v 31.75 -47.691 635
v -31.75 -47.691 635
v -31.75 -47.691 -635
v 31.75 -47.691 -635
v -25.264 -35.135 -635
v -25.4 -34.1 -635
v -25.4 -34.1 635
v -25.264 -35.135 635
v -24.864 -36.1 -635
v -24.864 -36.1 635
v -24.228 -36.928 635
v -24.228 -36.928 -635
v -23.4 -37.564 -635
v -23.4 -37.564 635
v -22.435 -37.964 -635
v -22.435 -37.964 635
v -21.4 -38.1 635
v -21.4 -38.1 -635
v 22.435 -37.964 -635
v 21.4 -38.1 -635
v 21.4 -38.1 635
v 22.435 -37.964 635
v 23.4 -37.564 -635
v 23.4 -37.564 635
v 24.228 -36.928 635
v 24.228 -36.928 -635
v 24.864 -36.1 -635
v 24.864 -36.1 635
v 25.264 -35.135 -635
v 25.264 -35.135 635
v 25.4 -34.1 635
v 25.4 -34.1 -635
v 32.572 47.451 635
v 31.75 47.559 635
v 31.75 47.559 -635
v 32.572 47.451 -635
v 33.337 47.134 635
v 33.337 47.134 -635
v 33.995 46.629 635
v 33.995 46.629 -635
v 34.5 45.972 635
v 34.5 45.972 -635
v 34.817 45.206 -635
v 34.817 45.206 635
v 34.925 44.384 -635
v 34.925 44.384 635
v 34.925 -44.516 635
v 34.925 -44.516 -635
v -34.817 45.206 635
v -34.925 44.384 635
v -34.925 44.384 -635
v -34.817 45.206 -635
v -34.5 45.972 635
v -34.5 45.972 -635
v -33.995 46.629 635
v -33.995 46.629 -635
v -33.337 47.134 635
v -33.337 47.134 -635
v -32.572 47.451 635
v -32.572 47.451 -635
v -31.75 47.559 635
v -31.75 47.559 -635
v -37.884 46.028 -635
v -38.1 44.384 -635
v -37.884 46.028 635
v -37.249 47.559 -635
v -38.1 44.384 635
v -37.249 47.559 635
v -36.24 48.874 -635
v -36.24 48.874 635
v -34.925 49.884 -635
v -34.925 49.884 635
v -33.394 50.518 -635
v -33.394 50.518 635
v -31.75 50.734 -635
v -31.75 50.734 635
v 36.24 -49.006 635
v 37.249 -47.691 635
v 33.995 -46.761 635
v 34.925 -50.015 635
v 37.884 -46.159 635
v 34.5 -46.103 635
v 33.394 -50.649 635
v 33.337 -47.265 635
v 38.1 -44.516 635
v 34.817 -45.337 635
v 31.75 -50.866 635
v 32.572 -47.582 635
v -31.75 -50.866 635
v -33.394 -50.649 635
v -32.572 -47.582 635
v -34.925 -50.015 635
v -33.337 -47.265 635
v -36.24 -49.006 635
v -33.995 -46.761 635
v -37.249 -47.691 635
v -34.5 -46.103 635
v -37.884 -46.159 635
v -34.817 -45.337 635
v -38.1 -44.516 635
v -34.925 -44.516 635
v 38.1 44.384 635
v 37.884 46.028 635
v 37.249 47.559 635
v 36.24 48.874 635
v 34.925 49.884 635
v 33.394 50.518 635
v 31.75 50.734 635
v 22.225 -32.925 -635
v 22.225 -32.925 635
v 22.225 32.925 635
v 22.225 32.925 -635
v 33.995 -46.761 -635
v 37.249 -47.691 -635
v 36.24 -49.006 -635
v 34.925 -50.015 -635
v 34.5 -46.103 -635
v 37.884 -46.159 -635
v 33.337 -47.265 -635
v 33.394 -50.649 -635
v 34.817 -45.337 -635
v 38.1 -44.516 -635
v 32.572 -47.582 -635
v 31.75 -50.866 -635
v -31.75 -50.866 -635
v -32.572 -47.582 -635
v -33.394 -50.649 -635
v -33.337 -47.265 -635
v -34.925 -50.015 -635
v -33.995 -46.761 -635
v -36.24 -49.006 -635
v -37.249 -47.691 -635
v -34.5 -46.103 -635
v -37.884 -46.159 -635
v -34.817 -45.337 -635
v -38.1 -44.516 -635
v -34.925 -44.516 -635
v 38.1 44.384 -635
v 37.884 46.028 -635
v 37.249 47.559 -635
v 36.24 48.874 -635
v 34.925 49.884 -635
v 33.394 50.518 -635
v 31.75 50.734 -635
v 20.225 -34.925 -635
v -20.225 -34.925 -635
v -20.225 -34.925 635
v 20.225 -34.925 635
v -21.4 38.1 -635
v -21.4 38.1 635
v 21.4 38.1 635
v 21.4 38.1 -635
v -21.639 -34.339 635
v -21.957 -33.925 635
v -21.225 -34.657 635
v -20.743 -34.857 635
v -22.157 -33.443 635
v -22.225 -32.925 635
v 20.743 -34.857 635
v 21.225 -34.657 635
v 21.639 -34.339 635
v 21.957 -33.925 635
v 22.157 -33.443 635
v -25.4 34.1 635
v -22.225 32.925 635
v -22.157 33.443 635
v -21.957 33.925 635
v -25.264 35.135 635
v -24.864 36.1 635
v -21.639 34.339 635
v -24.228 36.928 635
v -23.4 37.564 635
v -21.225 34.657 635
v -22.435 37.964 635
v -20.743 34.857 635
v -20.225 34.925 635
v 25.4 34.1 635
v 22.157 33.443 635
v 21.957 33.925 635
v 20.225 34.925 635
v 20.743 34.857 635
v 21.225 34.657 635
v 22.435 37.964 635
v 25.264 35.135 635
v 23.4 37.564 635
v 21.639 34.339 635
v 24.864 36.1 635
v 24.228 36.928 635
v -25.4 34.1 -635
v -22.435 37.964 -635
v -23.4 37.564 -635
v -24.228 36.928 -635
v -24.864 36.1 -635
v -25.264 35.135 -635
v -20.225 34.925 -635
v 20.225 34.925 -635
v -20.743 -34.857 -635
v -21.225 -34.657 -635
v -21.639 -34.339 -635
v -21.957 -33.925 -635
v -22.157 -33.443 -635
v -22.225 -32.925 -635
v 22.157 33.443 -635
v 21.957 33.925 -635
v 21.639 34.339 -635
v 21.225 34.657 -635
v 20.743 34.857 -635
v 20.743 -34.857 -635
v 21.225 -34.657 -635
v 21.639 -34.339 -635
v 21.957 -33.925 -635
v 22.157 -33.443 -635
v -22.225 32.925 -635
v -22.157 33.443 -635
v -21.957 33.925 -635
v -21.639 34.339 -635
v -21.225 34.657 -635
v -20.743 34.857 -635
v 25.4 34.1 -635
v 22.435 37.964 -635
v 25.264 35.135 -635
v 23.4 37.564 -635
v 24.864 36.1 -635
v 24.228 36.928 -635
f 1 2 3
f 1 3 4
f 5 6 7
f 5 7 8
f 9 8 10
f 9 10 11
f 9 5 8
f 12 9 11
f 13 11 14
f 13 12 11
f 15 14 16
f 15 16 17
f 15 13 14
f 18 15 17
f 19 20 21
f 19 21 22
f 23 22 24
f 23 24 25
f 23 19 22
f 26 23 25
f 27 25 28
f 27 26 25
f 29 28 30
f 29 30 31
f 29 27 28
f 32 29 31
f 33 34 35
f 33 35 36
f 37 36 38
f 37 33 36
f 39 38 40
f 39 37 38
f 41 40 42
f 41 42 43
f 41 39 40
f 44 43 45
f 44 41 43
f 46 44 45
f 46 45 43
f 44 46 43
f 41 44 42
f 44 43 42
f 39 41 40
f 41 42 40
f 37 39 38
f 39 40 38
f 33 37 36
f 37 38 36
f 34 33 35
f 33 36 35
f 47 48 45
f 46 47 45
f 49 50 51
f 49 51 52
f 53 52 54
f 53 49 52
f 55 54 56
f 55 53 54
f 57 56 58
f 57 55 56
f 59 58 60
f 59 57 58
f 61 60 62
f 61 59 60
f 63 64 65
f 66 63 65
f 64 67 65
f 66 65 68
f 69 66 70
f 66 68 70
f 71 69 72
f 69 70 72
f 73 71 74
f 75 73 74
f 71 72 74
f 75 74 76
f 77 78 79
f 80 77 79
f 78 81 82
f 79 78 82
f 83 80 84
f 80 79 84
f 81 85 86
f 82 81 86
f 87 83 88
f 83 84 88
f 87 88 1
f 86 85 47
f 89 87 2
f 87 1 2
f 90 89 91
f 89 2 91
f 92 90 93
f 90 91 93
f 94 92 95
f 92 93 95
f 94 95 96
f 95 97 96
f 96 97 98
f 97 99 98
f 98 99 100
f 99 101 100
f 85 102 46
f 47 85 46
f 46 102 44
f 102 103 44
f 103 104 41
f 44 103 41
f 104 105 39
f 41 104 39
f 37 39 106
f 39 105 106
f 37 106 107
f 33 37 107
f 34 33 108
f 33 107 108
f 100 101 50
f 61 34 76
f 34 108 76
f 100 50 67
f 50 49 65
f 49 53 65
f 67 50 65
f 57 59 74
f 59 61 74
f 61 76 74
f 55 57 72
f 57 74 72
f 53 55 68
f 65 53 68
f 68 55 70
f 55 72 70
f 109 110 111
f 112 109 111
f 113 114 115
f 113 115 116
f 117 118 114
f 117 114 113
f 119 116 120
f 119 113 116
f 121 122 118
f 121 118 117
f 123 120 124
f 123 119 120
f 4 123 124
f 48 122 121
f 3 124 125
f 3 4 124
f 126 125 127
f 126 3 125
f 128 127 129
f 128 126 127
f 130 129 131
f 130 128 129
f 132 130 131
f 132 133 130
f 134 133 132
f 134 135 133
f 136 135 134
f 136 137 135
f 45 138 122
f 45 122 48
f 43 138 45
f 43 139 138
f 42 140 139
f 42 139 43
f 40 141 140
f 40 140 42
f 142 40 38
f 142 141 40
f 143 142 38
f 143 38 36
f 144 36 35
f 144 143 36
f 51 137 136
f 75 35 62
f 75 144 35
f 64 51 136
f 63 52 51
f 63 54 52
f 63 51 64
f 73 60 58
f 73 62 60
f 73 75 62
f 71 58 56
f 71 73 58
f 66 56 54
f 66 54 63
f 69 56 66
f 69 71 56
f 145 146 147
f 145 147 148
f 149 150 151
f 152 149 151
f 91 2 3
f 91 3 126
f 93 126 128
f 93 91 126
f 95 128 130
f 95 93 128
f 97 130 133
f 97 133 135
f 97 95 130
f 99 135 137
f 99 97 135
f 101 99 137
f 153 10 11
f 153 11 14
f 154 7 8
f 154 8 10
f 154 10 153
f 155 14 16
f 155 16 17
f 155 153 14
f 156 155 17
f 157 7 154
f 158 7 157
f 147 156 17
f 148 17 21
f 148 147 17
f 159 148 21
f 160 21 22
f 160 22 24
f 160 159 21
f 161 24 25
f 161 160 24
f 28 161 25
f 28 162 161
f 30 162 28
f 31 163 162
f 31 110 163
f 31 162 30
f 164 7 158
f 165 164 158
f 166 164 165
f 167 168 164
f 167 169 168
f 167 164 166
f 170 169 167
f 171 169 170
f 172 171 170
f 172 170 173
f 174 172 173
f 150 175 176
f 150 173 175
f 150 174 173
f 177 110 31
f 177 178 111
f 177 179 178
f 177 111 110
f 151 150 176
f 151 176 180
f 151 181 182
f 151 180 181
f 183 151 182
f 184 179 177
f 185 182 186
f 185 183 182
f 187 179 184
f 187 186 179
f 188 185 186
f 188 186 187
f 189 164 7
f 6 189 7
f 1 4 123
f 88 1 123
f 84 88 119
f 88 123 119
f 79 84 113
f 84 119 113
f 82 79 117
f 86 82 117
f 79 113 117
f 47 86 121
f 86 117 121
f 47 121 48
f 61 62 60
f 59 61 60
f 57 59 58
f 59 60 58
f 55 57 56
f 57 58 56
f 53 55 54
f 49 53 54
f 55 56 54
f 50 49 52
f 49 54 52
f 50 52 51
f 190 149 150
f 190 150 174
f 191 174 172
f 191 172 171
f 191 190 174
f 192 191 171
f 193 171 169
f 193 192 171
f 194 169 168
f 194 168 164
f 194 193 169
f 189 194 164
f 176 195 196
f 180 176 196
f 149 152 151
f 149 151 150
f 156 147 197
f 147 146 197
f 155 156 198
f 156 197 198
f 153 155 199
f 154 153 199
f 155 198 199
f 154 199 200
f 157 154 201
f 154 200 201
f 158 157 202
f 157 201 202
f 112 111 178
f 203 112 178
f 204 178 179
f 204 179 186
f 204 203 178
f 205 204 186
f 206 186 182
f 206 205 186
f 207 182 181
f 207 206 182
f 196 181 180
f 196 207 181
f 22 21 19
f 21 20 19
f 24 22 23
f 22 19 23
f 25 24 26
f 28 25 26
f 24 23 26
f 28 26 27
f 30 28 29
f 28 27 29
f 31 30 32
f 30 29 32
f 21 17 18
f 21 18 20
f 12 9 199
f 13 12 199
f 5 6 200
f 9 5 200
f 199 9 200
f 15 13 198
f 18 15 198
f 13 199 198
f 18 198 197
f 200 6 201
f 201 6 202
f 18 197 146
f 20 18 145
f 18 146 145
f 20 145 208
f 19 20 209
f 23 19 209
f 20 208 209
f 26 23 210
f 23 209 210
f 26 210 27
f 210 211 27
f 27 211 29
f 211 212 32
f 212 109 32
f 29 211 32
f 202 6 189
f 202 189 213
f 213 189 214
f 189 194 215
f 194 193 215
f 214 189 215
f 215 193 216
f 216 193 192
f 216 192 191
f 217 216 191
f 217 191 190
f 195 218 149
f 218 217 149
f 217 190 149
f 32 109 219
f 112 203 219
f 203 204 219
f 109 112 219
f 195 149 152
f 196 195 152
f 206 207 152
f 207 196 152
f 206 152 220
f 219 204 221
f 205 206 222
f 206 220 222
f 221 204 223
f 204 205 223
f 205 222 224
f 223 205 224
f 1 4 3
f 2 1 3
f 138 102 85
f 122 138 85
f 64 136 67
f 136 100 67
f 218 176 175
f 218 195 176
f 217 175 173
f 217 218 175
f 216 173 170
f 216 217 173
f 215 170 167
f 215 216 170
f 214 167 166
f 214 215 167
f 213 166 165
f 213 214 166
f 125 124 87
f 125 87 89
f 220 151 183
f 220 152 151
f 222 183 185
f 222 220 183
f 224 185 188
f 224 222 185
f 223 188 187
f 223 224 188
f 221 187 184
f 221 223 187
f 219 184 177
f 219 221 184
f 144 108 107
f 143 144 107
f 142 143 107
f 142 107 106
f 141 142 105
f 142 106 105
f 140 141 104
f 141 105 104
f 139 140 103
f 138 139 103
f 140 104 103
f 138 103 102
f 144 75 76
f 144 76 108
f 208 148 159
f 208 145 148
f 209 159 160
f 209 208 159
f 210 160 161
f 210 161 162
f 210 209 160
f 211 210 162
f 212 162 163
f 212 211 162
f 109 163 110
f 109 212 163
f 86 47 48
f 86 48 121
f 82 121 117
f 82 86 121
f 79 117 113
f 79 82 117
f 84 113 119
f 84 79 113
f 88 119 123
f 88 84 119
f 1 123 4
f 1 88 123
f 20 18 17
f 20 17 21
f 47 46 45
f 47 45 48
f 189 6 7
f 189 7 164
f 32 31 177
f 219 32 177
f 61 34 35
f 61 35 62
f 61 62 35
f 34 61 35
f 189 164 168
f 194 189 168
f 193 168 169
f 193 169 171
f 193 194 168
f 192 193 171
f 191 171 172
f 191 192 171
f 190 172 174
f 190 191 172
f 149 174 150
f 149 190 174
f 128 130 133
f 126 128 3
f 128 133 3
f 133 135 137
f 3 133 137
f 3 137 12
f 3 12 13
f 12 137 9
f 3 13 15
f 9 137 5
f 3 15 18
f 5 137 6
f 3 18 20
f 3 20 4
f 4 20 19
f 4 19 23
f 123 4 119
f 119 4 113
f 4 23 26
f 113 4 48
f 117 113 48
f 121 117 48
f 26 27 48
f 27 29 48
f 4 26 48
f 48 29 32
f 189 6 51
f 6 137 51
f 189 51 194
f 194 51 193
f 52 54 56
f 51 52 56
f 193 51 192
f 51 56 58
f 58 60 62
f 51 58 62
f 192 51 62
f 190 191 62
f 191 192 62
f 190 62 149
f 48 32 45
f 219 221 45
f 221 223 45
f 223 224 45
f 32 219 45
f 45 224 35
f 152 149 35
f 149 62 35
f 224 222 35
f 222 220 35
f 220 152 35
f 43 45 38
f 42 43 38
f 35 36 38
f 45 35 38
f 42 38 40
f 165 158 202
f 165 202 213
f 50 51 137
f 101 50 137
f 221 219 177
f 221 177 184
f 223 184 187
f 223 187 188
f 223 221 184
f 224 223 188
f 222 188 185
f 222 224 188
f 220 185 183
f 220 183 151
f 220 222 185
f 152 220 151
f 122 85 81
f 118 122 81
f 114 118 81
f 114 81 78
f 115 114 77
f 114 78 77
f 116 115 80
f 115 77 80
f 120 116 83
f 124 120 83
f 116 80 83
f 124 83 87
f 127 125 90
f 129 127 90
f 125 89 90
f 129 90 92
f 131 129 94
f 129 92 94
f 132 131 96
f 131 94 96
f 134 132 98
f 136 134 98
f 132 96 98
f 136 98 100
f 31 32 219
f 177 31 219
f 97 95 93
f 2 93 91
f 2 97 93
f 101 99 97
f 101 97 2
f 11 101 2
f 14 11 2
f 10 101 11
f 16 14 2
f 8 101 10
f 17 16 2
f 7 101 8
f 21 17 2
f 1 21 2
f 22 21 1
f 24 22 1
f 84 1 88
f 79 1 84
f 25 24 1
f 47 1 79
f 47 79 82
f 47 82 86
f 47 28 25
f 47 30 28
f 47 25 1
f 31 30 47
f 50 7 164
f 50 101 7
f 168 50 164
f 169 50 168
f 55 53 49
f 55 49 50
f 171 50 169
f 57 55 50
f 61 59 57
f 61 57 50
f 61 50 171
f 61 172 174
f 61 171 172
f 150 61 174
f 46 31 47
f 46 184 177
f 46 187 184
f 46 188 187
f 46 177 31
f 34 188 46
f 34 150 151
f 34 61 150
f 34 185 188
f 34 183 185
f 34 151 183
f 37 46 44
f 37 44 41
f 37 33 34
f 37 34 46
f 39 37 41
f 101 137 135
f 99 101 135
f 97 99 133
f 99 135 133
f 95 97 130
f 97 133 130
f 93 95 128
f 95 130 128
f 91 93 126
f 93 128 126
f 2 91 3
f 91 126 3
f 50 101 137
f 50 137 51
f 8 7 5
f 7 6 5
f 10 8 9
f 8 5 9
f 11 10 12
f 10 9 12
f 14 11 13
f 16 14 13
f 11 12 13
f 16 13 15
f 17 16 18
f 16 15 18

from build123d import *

# Parameters (mm, degrees)
BOSS_EXTRUDE1_DEPTH = 635
BOSS_EXTRUDE4_START = 635
SKETCH8_W           = 50.8
SKETCH8_H           = 76.2
SKETCH8_W_2         = 44.45
SKETCH8_H_2         = 69.85
BOSS_EXTRUDE4_DEPTH = 1270
FILLET1_R           = 4
FILLET2_R           = 2
BOSS_EXTRUDE5_DEPTH = 1270


with BuildPart() as part:
    # Sketch4 → Boss-Extrude1 (new body, symmetric)
    with BuildSketch(Plane.XY):
        with BuildLine():
            Line((31.75, -50.865662775), (-31.75, -50.865662775))
            ThreePointArc((-31.75, -50.865662775), (-36.240128061, -49.005790836), (-38.1, -44.515662775))
            Line((-38.1, -44.515662775), (-38.1, 44.384337225))
            ThreePointArc((-38.1, 44.384337225), (-36.240128061, 48.874465286), (-31.75, 50.734337225))
            Line((-31.75, 50.734337225), (31.75, 50.734337225))
            ThreePointArc((31.75, 50.734337225), (36.240128061, 48.874465286), (38.1, 44.384337225))
            Line((38.1, 44.384337225), (38.1, -44.515662775))
            ThreePointArc((38.1, -44.515662775), (36.240128061, -49.005790836), (31.75, -50.865662775))
        make_face()
        with BuildLine():
            Line((31.75, -47.690662775), (-31.75, -47.690662775))
            ThreePointArc((-31.75, -47.690662775), (-33.99506403, -46.760726805), (-34.925, -44.515662775))
            Line((-34.925, -44.515662775), (-34.925, 44.384337225))
            ThreePointArc((-34.925, 44.384337225), (-33.99506403, 46.629401255), (-31.75, 47.559337225))
            Line((-31.75, 47.559337225), (31.75, 47.559337225))
            ThreePointArc((31.75, 47.559337225), (33.99506403, 46.629401255), (34.925, 44.384337225))
            Line((34.925, 44.384337225), (34.925, -44.515662775))
            ThreePointArc((34.925, -44.515662775), (33.99506403, -46.760726805), (31.75, -47.690662775))
        make_face(mode=Mode.SUBTRACT)
    extrude(amount=BOSS_EXTRUDE1_DEPTH, both=True)


with BuildPart() as body_2:
    # Sketch8 → Boss-Extrude4 (new body)
    with BuildSketch(Plane.XY.offset(BOSS_EXTRUDE4_START)):
        Rectangle(SKETCH8_W, SKETCH8_H)
        Rectangle(SKETCH8_W_2, SKETCH8_H_2, mode=Mode.SUBTRACT)
    extrude(amount=-BOSS_EXTRUDE4_DEPTH)

    # Fillet1
    fillet1_edges = [body_2.edges().sort_by_distance(p)[0] for p in [
        (25.4, 38.1, 0),
        (25.4, -38.1, 0),
        (-25.4, -38.1, 0),
        (-25.4, 38.1, 0),
    ]]
    fillet(fillet1_edges, radius=FILLET1_R)

    # Fillet2
    fillet2_edges = [body_2.edges().sort_by_distance(p)[0] for p in [
        (22.225, -34.925, 0),
        (-22.225, -34.925, 0),
        (-22.225, 34.925, 0),
        (22.225, 34.925, 0),
    ]]
    fillet(fillet2_edges, radius=FILLET2_R)


with BuildPart() as body_3:
    # Sketch9 → Boss-Extrude5 (new body)
    with BuildSketch(Plane(origin=(0, 0, -635), x_dir=(-1, 0, 0), z_dir=(0, 0, -1))):
        with BuildLine():
            Line((31.75, -47.690662775), (-31.75, -47.690662775))
            ThreePointArc((-31.75, -47.690662775), (-33.99506403, -46.760726805), (-34.925, -44.515662775))
            Line((-34.925, -44.515662775), (-34.925, 44.384337225))
            ThreePointArc((-34.925, 44.384337225), (-33.99506403, 46.629401255), (-31.75, 47.559337225))
            Line((-31.75, 47.559337225), (31.75, 47.559337225))
            ThreePointArc((31.75, 47.559337225), (33.99506403, 46.629401255), (34.925, 44.384337225))
            Line((34.925, 44.384337225), (34.925, -44.515662775))
            ThreePointArc((34.925, -44.515662775), (33.99506403, -46.760726805), (31.75, -47.690662775))
        make_face()
        with BuildLine():
            Line((21.4, -38.1), (-21.4, -38.1))
            ThreePointArc((-21.4, -38.1), (-24.228427125, -36.928427125), (-25.4, -34.1))
            Line((-25.4, -34.1), (-25.4, 34.1))
            ThreePointArc((-25.4, 34.1), (-24.228427125, 36.928427125), (-21.4, 38.1))
            Line((-21.4, 38.1), (21.4, 38.1))
            ThreePointArc((21.4, 38.1), (24.228427125, 36.928427125), (25.4, 34.1))
            Line((25.4, 34.1), (25.4, -34.1))
            ThreePointArc((25.4, -34.1), (24.228427125, -36.928427125), (21.4, -38.1))
        make_face(mode=Mode.SUBTRACT)
    extrude(amount=-BOSS_EXTRUDE5_DEPTH)


solid = Compound([part.part, body_2.part, body_3.part])
